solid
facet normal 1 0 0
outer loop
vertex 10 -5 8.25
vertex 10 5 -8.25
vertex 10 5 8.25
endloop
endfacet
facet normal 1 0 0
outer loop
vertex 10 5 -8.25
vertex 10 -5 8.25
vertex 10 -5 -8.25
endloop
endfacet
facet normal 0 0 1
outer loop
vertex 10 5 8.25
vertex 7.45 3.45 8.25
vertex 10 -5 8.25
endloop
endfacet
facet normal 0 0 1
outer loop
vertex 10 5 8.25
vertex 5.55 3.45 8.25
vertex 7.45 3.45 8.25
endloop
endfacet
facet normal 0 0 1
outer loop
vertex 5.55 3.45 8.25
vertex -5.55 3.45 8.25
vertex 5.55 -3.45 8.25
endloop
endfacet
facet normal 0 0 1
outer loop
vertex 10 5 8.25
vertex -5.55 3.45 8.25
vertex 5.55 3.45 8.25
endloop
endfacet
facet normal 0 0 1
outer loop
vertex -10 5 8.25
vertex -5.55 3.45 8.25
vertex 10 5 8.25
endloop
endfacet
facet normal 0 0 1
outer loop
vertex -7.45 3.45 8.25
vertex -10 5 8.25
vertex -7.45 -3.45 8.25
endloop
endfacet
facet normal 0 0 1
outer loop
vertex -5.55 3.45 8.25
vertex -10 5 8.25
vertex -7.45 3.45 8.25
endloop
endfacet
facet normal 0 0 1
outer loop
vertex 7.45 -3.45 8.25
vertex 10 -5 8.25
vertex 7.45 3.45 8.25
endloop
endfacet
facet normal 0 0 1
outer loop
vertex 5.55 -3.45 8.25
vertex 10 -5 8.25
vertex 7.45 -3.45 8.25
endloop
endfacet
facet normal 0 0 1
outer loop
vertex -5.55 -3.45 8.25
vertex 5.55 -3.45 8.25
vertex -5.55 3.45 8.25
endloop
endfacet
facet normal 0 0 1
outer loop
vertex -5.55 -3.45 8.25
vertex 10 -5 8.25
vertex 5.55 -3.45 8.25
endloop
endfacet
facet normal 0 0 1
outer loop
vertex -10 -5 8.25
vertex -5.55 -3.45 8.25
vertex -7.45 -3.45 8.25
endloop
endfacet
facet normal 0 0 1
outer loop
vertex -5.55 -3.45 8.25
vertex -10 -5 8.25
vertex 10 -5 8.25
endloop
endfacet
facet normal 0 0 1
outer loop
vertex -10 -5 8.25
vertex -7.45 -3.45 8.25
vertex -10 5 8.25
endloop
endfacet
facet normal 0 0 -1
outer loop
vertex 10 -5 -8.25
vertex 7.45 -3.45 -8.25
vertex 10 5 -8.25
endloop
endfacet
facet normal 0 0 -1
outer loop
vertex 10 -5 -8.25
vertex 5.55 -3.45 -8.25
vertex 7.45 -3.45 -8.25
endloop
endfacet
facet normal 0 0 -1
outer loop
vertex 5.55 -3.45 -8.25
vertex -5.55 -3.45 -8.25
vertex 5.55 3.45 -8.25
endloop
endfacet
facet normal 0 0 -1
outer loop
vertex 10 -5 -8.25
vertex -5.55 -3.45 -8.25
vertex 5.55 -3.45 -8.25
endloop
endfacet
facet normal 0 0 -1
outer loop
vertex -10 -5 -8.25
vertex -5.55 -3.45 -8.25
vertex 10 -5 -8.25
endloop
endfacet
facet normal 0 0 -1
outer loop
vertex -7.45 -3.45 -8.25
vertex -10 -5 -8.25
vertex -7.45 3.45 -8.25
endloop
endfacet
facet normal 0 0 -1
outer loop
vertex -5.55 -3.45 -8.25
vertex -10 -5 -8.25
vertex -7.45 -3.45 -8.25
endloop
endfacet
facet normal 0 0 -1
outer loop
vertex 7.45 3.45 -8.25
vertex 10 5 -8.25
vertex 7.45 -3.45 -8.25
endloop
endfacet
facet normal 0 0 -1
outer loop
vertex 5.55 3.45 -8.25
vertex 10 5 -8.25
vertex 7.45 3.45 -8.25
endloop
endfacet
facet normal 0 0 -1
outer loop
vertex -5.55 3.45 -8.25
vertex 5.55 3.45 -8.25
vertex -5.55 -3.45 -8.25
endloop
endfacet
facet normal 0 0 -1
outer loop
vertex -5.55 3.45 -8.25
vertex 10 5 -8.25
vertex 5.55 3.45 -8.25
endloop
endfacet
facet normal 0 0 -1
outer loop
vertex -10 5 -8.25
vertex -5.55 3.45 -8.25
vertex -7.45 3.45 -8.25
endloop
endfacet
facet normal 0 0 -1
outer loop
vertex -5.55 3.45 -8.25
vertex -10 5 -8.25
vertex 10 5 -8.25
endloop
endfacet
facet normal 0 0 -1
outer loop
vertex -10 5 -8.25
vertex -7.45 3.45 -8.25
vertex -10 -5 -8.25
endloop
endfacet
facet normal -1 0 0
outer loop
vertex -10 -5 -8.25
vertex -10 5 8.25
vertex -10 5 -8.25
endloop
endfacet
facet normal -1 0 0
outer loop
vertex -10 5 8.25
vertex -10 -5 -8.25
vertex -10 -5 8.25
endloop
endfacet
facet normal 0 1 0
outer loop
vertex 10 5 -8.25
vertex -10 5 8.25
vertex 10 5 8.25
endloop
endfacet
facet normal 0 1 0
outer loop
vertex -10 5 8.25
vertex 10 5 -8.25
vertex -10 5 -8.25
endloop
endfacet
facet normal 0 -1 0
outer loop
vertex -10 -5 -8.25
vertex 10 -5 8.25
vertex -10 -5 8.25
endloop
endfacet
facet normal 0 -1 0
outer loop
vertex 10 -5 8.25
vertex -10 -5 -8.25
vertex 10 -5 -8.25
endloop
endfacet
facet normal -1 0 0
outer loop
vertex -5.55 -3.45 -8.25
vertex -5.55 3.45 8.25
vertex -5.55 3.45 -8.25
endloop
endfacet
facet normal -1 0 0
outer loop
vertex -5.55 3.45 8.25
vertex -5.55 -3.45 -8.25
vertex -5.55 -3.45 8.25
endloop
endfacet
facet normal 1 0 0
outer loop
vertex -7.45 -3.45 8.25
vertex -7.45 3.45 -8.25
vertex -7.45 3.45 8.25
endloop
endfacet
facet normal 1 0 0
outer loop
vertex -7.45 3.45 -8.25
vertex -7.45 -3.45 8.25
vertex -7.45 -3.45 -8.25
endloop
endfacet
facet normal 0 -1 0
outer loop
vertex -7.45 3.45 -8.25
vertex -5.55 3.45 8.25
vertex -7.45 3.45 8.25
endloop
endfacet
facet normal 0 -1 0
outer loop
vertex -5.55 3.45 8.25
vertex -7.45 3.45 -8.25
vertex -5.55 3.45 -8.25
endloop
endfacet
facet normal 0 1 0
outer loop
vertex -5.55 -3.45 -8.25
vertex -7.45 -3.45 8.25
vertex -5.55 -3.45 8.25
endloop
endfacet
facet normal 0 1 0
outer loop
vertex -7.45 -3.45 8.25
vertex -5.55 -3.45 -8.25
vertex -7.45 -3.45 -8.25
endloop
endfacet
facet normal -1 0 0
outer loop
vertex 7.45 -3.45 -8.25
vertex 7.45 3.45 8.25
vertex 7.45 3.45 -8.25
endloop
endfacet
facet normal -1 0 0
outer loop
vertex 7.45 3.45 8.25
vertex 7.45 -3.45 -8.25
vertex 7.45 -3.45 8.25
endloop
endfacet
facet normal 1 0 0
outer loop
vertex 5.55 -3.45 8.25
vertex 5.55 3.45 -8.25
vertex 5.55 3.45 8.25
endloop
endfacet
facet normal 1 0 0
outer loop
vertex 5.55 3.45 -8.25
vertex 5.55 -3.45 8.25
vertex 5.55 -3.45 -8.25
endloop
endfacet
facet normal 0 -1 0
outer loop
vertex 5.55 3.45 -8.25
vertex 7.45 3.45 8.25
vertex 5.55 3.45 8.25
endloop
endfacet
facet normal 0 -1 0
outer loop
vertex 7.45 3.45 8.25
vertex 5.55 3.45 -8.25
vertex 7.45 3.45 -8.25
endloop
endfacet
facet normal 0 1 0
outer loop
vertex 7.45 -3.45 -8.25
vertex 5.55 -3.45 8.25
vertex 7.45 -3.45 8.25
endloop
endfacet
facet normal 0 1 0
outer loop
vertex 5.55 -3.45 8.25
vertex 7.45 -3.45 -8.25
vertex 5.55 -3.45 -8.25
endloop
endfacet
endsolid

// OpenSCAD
module acsocket(x=38,y=38,z=16.5) {
  overextrusion = 0.2;
  pin_thickness = 1.5 + 2 * overextrusion;
  pin_width = 6.5 + 2 * overextrusion;
  pin_length = 16.5;
  newZ=max(z,pin_length);
  difference() {
    cube([x,y,newZ],center=true);
    translate([-6.5,0,newZ-pin_length])
      cube([pin_thickness,pin_width,pin_length],center=true);
    translate([6.5,0,newZ-pin_length])
      cube([pin_thickness,pin_width,pin_length],center=true);
  }
}

acsocket(20,10,0);
